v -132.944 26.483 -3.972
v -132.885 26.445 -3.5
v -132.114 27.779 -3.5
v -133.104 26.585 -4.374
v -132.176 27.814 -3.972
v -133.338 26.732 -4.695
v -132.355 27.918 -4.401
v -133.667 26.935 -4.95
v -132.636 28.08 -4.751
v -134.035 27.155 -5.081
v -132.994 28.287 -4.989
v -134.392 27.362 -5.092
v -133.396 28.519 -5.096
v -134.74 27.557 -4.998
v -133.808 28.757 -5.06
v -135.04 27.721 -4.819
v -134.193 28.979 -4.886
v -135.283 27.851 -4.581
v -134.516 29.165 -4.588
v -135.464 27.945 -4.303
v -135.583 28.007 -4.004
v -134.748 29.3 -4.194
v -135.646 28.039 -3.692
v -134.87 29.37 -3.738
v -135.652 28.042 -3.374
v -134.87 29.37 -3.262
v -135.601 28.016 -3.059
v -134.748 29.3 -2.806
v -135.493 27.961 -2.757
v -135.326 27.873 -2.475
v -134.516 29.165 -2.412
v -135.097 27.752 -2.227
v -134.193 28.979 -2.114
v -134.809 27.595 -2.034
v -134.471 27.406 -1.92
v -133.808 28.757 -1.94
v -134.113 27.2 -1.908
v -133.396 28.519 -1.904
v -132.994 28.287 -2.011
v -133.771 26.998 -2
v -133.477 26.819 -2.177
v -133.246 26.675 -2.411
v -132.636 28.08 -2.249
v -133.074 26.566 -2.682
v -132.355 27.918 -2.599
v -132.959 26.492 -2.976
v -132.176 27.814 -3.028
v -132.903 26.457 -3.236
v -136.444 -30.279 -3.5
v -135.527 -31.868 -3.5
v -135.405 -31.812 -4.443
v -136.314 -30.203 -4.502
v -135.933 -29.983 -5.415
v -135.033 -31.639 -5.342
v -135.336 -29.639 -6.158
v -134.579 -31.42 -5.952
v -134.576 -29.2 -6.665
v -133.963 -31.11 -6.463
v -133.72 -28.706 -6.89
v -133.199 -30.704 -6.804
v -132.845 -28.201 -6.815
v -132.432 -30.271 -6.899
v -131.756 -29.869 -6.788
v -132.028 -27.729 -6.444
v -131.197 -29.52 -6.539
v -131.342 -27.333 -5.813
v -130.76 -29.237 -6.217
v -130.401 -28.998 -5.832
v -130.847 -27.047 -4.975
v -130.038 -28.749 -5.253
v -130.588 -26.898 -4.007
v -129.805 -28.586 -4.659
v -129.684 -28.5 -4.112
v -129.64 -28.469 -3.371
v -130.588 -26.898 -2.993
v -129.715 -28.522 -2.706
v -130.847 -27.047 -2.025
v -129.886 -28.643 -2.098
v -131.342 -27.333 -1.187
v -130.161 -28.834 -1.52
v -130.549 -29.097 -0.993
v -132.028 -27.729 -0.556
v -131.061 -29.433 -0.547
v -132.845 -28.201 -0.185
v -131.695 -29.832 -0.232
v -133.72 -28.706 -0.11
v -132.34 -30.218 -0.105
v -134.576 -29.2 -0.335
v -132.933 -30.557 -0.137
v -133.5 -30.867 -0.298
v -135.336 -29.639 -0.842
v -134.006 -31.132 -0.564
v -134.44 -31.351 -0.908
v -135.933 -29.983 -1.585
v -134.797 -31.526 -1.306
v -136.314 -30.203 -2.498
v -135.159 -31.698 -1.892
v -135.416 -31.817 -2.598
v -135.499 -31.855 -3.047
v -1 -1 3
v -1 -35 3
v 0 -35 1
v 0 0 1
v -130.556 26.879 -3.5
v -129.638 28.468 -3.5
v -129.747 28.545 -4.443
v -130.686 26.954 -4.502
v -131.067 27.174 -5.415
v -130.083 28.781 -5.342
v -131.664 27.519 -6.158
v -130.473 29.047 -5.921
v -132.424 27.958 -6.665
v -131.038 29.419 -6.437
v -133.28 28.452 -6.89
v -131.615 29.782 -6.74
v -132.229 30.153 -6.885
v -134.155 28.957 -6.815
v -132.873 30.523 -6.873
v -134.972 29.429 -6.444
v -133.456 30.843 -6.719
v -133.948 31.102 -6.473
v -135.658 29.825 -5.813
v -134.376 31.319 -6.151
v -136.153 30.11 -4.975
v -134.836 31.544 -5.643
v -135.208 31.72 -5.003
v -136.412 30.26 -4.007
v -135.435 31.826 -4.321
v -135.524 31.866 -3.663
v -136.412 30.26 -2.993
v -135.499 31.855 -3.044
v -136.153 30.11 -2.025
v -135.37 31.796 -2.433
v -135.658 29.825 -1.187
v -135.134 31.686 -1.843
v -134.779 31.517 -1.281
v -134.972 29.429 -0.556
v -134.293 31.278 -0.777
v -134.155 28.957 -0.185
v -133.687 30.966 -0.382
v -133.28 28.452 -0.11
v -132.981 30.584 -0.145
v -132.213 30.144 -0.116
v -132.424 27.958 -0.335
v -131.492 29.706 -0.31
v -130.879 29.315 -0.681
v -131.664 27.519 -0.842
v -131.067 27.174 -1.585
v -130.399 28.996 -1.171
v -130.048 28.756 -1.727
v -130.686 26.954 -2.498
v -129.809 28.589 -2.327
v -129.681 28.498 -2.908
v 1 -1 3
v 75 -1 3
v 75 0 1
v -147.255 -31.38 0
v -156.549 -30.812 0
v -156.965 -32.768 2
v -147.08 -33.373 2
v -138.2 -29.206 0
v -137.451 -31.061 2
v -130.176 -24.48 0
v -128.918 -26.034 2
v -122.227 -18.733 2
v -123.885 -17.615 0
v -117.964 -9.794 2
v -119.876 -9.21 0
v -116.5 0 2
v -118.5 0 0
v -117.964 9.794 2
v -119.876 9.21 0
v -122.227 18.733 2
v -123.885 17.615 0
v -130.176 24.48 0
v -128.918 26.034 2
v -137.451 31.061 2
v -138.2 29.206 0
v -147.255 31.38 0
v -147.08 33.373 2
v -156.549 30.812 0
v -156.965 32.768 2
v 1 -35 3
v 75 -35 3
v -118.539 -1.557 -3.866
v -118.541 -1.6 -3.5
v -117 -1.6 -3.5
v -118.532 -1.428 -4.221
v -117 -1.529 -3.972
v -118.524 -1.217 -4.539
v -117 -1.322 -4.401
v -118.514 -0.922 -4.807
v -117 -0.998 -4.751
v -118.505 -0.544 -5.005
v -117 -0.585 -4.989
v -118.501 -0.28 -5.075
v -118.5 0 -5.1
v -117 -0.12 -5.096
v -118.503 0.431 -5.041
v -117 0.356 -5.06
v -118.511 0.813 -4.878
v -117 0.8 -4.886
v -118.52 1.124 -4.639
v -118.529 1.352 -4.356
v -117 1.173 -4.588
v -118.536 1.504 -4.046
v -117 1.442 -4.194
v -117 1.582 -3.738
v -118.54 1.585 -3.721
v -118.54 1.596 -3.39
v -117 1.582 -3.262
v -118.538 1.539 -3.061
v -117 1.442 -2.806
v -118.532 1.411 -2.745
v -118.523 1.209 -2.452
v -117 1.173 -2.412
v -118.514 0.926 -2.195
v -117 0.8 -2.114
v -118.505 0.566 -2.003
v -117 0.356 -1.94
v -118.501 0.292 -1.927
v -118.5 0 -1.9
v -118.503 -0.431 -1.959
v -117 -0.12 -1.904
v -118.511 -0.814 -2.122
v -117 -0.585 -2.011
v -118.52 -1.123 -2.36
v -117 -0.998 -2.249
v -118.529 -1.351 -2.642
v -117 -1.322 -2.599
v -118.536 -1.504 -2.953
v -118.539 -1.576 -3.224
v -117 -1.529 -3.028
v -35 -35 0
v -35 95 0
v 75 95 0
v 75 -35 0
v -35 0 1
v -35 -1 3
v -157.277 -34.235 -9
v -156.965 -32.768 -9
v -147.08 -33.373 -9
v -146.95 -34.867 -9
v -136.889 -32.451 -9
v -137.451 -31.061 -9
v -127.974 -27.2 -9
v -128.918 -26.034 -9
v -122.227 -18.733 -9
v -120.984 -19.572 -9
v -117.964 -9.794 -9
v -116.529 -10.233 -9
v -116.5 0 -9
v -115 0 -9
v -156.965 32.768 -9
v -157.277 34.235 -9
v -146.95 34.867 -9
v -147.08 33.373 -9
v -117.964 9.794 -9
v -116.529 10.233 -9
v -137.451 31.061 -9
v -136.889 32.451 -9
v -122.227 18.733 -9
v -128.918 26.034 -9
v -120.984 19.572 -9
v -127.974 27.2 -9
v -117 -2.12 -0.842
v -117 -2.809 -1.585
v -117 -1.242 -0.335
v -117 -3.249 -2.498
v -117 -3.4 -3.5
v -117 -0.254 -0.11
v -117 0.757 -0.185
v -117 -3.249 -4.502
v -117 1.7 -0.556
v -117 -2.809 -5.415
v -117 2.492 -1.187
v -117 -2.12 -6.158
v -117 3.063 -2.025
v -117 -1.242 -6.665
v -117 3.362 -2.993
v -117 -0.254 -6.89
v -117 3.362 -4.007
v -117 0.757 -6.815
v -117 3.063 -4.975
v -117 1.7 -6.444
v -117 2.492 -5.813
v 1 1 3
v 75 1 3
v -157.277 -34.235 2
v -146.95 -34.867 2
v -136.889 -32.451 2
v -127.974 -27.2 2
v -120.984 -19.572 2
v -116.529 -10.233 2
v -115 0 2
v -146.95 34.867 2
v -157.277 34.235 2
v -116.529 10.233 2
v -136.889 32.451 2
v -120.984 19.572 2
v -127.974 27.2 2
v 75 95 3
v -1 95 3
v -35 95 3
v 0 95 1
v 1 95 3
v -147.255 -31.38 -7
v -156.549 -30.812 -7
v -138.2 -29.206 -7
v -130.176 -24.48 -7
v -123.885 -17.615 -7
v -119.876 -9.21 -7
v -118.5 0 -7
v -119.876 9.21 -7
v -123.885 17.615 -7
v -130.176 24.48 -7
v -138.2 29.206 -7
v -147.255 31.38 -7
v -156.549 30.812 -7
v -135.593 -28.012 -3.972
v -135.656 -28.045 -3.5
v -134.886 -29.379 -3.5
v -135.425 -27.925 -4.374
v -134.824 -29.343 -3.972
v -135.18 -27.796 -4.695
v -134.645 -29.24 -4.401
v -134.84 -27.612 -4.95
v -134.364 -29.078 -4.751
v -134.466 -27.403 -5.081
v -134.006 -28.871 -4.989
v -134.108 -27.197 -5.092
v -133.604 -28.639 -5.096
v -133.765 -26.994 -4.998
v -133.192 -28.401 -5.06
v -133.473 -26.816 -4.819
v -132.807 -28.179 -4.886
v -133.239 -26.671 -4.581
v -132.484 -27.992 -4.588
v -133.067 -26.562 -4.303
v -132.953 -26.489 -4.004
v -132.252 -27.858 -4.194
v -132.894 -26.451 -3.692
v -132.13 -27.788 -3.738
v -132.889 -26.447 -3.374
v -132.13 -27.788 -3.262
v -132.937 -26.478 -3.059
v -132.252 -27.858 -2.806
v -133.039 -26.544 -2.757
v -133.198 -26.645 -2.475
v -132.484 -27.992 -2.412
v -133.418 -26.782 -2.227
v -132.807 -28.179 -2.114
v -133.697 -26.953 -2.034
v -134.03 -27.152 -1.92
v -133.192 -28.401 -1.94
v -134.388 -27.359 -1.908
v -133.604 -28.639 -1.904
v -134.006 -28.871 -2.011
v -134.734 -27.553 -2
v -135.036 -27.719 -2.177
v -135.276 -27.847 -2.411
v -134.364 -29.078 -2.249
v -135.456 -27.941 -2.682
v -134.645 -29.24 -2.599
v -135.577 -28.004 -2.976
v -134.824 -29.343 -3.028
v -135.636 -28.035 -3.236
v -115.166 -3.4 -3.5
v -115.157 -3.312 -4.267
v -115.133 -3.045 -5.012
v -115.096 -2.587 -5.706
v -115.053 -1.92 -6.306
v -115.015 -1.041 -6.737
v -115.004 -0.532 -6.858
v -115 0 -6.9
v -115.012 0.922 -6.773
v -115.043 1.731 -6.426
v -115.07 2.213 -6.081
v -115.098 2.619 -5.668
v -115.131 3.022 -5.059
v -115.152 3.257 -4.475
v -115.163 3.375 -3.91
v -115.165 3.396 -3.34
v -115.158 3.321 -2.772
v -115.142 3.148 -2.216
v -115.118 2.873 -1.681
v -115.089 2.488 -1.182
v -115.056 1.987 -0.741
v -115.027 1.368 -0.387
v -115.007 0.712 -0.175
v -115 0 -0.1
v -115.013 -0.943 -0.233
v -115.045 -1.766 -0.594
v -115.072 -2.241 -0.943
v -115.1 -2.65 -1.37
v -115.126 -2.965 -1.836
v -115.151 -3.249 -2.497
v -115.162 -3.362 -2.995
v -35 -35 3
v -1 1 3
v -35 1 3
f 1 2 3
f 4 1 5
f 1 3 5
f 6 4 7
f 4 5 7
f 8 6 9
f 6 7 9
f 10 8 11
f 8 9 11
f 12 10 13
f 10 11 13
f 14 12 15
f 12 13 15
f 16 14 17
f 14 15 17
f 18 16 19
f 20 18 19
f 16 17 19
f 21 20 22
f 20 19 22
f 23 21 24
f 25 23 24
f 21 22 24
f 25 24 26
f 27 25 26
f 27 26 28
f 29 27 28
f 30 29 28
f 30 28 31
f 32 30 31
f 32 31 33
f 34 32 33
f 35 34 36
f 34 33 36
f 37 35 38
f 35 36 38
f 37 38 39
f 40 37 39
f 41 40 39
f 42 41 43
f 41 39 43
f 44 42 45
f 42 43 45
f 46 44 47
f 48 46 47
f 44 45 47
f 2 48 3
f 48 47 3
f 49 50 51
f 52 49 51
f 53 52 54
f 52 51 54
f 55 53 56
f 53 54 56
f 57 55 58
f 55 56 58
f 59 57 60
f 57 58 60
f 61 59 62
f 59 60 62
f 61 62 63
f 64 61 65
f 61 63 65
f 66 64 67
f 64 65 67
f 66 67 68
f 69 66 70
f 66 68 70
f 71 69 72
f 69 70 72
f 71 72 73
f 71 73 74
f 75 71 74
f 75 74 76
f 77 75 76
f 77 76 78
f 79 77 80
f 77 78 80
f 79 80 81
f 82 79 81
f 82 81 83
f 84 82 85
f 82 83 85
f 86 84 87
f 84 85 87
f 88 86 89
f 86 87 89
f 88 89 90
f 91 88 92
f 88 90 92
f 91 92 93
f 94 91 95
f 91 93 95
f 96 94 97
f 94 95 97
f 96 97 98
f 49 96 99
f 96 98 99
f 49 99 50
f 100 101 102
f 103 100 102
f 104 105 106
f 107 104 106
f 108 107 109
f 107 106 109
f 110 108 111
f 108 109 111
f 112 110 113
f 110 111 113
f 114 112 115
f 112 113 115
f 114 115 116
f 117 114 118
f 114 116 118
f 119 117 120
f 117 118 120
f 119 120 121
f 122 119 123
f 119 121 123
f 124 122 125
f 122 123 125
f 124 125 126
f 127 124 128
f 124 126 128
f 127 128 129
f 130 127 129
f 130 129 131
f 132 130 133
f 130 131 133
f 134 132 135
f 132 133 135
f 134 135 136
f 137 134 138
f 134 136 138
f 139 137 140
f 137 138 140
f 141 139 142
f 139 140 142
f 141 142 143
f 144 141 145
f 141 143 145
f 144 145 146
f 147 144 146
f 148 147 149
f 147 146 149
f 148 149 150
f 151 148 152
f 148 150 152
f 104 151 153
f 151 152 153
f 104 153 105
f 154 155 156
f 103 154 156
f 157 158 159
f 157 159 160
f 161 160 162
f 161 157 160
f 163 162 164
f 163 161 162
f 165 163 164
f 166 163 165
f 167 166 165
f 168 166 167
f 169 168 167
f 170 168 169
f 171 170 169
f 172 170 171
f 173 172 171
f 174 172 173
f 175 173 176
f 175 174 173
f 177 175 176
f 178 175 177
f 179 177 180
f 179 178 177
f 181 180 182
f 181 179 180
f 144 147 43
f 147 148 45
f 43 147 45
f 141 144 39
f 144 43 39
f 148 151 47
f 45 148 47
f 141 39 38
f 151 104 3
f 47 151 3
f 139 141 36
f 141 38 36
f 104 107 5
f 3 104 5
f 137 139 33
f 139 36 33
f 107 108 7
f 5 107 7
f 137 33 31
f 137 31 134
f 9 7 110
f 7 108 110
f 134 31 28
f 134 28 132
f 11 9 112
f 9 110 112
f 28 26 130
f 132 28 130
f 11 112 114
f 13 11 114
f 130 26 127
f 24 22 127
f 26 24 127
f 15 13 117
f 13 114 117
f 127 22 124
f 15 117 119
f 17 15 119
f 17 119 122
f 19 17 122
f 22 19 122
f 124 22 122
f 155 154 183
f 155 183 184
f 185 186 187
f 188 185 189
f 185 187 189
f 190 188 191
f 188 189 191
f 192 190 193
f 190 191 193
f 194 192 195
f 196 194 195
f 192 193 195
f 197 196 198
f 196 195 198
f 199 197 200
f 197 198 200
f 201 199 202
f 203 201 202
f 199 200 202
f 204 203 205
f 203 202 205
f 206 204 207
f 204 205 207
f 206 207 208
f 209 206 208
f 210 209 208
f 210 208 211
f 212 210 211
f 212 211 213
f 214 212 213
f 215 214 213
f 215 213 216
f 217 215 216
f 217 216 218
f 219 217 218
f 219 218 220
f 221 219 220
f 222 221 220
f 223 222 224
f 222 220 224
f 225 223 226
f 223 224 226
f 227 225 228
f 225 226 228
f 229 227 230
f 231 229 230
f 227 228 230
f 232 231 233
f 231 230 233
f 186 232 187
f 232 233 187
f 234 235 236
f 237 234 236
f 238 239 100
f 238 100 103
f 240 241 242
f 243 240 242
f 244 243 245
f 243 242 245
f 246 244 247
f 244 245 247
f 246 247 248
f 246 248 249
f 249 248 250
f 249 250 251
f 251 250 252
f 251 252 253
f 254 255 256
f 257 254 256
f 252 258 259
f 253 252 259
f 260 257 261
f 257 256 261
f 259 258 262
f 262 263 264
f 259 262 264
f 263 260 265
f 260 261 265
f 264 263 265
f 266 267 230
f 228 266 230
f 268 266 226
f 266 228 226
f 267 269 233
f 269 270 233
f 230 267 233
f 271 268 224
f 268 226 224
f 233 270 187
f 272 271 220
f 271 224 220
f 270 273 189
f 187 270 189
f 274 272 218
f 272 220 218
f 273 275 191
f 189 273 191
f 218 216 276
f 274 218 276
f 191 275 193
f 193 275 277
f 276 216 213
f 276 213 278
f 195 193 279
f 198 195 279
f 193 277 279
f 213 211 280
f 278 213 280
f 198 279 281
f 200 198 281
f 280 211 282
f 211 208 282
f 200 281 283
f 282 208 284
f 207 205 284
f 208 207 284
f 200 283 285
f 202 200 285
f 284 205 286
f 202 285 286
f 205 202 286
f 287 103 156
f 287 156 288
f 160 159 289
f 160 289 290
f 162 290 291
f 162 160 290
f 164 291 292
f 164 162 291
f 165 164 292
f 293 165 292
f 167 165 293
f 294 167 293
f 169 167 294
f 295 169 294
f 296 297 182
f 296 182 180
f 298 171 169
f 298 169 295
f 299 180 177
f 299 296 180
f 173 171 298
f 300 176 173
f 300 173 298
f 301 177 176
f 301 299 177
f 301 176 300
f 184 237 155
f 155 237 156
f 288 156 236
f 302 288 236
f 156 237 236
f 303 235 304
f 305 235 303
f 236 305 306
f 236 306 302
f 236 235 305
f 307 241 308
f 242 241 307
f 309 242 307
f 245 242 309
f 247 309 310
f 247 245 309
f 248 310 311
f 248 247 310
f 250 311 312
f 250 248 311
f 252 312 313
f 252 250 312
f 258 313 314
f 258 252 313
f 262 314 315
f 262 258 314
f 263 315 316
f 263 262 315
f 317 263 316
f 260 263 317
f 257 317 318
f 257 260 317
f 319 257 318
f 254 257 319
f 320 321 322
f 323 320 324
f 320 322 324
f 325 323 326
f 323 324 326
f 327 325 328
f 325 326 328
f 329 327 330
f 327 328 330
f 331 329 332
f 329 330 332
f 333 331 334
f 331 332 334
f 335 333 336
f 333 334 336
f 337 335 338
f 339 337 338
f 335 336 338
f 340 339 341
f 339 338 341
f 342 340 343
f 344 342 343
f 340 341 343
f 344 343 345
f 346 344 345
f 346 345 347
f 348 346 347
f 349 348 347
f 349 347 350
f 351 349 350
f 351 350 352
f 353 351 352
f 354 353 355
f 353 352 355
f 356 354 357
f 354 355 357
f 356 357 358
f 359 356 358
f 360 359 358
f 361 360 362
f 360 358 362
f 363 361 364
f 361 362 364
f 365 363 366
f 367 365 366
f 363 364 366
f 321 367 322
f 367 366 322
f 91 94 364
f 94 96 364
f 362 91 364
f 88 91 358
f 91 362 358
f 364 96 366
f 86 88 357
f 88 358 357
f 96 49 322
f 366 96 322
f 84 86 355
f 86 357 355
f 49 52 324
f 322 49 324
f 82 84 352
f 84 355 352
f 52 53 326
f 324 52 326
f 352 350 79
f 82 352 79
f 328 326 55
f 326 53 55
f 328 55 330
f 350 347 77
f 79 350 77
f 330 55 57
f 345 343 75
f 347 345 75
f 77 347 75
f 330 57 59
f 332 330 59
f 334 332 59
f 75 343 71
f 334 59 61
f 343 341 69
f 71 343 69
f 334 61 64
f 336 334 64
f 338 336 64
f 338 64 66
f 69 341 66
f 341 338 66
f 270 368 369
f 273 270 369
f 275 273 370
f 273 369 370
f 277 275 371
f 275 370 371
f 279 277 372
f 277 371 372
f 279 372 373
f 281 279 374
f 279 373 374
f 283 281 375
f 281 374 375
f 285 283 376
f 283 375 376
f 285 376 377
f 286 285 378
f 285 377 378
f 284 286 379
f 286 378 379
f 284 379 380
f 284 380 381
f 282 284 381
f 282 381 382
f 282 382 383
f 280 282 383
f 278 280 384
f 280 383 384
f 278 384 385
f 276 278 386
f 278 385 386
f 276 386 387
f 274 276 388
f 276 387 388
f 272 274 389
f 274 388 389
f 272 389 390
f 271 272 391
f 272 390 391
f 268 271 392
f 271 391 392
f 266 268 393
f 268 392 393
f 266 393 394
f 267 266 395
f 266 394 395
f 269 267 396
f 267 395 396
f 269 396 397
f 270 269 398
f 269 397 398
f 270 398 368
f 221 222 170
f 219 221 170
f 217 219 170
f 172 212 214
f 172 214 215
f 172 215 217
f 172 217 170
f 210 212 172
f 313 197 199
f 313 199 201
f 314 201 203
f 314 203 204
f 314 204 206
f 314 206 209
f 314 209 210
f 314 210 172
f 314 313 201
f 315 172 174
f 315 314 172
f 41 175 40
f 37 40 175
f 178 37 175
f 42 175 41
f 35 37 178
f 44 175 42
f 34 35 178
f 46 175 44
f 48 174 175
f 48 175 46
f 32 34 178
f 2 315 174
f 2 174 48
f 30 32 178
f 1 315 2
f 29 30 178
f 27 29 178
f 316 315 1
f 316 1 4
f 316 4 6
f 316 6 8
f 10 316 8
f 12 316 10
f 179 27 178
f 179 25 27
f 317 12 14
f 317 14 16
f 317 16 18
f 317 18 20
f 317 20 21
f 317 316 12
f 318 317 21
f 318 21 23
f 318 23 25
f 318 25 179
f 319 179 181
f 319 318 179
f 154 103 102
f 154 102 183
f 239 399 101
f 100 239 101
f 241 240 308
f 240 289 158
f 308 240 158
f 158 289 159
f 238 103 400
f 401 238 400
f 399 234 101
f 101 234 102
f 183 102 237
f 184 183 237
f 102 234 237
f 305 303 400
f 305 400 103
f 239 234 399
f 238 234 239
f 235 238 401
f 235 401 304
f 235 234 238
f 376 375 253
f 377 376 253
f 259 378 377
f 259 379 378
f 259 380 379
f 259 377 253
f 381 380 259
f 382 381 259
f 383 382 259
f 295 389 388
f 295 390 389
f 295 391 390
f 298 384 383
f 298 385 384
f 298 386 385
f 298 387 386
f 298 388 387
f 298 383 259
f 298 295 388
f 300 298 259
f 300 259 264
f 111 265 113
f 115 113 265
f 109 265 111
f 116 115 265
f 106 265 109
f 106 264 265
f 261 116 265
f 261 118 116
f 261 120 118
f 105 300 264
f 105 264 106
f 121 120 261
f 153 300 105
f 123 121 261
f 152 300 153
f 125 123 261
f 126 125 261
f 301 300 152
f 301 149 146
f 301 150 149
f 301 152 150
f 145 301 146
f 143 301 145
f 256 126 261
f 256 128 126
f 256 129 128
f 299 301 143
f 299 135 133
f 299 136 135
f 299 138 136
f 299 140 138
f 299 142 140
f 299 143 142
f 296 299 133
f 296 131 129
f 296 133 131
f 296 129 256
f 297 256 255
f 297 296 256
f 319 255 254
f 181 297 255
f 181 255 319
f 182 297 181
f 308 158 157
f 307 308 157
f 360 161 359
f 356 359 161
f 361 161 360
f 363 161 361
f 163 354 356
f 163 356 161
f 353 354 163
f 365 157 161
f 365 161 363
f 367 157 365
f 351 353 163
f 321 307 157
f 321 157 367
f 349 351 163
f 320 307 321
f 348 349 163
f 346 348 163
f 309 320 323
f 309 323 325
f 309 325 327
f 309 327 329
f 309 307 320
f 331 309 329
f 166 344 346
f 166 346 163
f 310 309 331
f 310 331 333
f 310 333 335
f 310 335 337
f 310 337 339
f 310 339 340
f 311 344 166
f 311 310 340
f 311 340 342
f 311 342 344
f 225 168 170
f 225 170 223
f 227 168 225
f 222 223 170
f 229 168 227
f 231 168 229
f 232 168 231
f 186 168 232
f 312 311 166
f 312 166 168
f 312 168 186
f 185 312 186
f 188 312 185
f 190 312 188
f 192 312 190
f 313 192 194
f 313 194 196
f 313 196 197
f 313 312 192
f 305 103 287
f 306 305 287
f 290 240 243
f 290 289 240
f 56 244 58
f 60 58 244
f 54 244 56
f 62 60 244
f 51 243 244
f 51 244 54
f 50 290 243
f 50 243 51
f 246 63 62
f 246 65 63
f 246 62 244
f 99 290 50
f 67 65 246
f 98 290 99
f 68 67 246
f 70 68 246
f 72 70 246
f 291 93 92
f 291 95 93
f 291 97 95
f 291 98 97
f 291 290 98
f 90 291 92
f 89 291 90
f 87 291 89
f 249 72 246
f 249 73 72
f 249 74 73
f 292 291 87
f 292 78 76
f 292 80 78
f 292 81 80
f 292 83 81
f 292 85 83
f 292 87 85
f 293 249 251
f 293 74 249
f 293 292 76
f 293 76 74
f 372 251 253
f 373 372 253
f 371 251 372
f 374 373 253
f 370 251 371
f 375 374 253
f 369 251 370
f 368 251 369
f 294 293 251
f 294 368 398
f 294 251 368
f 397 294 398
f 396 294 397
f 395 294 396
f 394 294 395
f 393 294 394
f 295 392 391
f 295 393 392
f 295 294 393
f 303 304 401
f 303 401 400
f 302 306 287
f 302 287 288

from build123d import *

# Parameters (mm, degrees)
F0_W           = 110
F0_H           = 130
F0_W_2         = 80
F0_H_2         = 100
F1_DEPTH       = 3
F3_DEPTH       = 140
F5_DEPTH       = 120
F7_R           = 35
F7_R_2         = 31.5
F8_DEPTH       = 5.5
F9_W           = 2.7181416105
F9_H           = 1.6
F15_ANGLE_BACK = 78
F15_ANGLE      = 156


# Not quite as in the source:
# - a feature names something its author has since deleted; it is built from what else it names


with BuildPart() as f1:
    # F0 (on Top) → F1 (new body)
    with BuildSketch(Plane.XY):
        with Locations((20, 30)):
            Rectangle(F0_W, F0_H)
        with Locations((20, 30)):
            Rectangle(F0_W_2, F0_H_2, mode=Mode.SUBTRACT)
        with Locations((20, 30)):
            Rectangle(F0_W_2, F0_H_2)
    extrude(amount=F1_DEPTH)

    # F2 (on face) → F3 (cut)
    with BuildSketch(Plane.XZ.offset(35)):
        Polygon((1, 3), (-1, 3), (0, 1), align=None)
    extrude(amount=-F3_DEPTH, mode=Mode.SUBTRACT)

    # F4 (on face) → F5 (cut)
    with BuildSketch(Plane.YZ.offset(75)):
        Polygon((1, 3), (-1, 3), (0, 1), align=None)
    extrude(amount=-F5_DEPTH, mode=Mode.SUBTRACT)


with BuildPart() as f8:
    # F7 (on offset) → F8 (new body, symmetric)
    with BuildSketch(Plane.XY.offset(-3.5)):
        with Locations((-150, 0)):
            Circle(F7_R)
        with Locations((-150, 0)):
            Circle(F7_R_2, mode=Mode.SUBTRACT)
    extrude(amount=F8_DEPTH, both=True)

    # F9 (on offset) → F10 (revolve, cut)
    with BuildSketch(Plane.XY.offset(-3.5)):
        Polygon((-132.0531194037, -31.0849090301), (-133.5, -28.5788383249), (-134.8856406461, -29.3788383249), (-136.4444863729, -30.2788383249), (-134.9976057766, -32.7849090301), align=None)
        Polygon((-134.8856406461, -29.3788383249), (-133.5, -28.5788383249), (-134.8590708053, -26.2248586391), (-136.2447114513, -27.0248586391), align=None)
    revolve(axis=Axis((-118.5595137524, -54.4565195956, -3.5), (0.5, -0.8660254038, 0)), mode=Mode.SUBTRACT)

    # F9 (on offset) → F11 (revolve, cut)
    with BuildSketch(Plane.XY.offset(-3.5)):
        Polygon((-114.1062388075, 0), (-117, 0), (-117, -1.6), (-117, -3.4), (-114.1062388075, -3.4), align=None)
        with Locations((-118.3590708053, -0.8)):
            Rectangle(F9_W, F9_H)
    revolve(axis=Axis((-87.1190275047, 0, -3.5), (1, 0, 0)), mode=Mode.SUBTRACT)

    # F9 (on offset) → F12 (revolve, cut)
    with BuildSketch(Plane.XY.offset(-3.5)):
        Polygon((-132.0531194037, 31.0849090301), (-133.5, 28.5788383249), (-132.1143593539, 27.7788383249), (-130.5555136271, 26.8788383249), (-129.1086330309, 29.3849090301), align=None)
        Polygon((-132.1143593539, 27.7788383249), (-133.5, 28.5788383249), (-134.8590708053, 26.2248586391), (-133.4734301592, 25.4248586391), align=None)
    revolve(axis=Axis((-118.5595137524, 54.4565195956, -3.5), (0.5, 0.8660254038, 0)), mode=Mode.SUBTRACT)

    # F9 (on offset) → F13 (revolve, cut)
    with BuildSketch(Plane.XY.offset(-3.5)):
        Polygon((-167.9468805963, -31.0849090301), (-166.5, -28.5788383249), (-167.8856406461, -27.7788383249), (-169.4444863729, -26.8788383249), (-170.8913669691, -29.3849090301), align=None)
        Polygon((-167.8856406461, -27.7788383249), (-166.5, -28.5788383249), (-165.1409291947, -26.2248586391), (-166.5265698408, -25.4248586391), align=None)
    revolve(axis=Axis((-181.4404862476, -54.4565195956, -3.5), (-0.5, -0.8660254038, 0)), mode=Mode.SUBTRACT)

    # F14 (on Front) → F15 (revolve, cut)
    with BuildSketch(Plane.XZ, mode=Mode.PRIVATE) as f15_sk:
        Polygon((-185, 0), (-185, -7), (-185, -9), (-183.5, -9), (-181.5, -7), (-181.5, 0), (-183.5, 2), (-185, 2), align=None)
    revolve(f15_sk.sketch.rotate(Axis((-150, 0, -3.5), (0, 0, 1)), -F15_ANGLE_BACK), axis=Axis((-150, 0, -3.5), (0, 0, 1)), revolution_arc=F15_ANGLE, mode=Mode.SUBTRACT)

    # F14 (on Front) → F16 (revolve, cut)
    with BuildSketch(Plane.XZ):
        Polygon((-181.5, 2), (-183.5, 2), (-181.5, 0), align=None)
        Polygon((-181.5, -7), (-183.5, -9), (-181.5, -9), align=None)
    revolve(axis=Axis((-150, 0, -3.5), (0, 0, 1)), mode=Mode.SUBTRACT)


solid = Compound([f1.part, f8.part])
